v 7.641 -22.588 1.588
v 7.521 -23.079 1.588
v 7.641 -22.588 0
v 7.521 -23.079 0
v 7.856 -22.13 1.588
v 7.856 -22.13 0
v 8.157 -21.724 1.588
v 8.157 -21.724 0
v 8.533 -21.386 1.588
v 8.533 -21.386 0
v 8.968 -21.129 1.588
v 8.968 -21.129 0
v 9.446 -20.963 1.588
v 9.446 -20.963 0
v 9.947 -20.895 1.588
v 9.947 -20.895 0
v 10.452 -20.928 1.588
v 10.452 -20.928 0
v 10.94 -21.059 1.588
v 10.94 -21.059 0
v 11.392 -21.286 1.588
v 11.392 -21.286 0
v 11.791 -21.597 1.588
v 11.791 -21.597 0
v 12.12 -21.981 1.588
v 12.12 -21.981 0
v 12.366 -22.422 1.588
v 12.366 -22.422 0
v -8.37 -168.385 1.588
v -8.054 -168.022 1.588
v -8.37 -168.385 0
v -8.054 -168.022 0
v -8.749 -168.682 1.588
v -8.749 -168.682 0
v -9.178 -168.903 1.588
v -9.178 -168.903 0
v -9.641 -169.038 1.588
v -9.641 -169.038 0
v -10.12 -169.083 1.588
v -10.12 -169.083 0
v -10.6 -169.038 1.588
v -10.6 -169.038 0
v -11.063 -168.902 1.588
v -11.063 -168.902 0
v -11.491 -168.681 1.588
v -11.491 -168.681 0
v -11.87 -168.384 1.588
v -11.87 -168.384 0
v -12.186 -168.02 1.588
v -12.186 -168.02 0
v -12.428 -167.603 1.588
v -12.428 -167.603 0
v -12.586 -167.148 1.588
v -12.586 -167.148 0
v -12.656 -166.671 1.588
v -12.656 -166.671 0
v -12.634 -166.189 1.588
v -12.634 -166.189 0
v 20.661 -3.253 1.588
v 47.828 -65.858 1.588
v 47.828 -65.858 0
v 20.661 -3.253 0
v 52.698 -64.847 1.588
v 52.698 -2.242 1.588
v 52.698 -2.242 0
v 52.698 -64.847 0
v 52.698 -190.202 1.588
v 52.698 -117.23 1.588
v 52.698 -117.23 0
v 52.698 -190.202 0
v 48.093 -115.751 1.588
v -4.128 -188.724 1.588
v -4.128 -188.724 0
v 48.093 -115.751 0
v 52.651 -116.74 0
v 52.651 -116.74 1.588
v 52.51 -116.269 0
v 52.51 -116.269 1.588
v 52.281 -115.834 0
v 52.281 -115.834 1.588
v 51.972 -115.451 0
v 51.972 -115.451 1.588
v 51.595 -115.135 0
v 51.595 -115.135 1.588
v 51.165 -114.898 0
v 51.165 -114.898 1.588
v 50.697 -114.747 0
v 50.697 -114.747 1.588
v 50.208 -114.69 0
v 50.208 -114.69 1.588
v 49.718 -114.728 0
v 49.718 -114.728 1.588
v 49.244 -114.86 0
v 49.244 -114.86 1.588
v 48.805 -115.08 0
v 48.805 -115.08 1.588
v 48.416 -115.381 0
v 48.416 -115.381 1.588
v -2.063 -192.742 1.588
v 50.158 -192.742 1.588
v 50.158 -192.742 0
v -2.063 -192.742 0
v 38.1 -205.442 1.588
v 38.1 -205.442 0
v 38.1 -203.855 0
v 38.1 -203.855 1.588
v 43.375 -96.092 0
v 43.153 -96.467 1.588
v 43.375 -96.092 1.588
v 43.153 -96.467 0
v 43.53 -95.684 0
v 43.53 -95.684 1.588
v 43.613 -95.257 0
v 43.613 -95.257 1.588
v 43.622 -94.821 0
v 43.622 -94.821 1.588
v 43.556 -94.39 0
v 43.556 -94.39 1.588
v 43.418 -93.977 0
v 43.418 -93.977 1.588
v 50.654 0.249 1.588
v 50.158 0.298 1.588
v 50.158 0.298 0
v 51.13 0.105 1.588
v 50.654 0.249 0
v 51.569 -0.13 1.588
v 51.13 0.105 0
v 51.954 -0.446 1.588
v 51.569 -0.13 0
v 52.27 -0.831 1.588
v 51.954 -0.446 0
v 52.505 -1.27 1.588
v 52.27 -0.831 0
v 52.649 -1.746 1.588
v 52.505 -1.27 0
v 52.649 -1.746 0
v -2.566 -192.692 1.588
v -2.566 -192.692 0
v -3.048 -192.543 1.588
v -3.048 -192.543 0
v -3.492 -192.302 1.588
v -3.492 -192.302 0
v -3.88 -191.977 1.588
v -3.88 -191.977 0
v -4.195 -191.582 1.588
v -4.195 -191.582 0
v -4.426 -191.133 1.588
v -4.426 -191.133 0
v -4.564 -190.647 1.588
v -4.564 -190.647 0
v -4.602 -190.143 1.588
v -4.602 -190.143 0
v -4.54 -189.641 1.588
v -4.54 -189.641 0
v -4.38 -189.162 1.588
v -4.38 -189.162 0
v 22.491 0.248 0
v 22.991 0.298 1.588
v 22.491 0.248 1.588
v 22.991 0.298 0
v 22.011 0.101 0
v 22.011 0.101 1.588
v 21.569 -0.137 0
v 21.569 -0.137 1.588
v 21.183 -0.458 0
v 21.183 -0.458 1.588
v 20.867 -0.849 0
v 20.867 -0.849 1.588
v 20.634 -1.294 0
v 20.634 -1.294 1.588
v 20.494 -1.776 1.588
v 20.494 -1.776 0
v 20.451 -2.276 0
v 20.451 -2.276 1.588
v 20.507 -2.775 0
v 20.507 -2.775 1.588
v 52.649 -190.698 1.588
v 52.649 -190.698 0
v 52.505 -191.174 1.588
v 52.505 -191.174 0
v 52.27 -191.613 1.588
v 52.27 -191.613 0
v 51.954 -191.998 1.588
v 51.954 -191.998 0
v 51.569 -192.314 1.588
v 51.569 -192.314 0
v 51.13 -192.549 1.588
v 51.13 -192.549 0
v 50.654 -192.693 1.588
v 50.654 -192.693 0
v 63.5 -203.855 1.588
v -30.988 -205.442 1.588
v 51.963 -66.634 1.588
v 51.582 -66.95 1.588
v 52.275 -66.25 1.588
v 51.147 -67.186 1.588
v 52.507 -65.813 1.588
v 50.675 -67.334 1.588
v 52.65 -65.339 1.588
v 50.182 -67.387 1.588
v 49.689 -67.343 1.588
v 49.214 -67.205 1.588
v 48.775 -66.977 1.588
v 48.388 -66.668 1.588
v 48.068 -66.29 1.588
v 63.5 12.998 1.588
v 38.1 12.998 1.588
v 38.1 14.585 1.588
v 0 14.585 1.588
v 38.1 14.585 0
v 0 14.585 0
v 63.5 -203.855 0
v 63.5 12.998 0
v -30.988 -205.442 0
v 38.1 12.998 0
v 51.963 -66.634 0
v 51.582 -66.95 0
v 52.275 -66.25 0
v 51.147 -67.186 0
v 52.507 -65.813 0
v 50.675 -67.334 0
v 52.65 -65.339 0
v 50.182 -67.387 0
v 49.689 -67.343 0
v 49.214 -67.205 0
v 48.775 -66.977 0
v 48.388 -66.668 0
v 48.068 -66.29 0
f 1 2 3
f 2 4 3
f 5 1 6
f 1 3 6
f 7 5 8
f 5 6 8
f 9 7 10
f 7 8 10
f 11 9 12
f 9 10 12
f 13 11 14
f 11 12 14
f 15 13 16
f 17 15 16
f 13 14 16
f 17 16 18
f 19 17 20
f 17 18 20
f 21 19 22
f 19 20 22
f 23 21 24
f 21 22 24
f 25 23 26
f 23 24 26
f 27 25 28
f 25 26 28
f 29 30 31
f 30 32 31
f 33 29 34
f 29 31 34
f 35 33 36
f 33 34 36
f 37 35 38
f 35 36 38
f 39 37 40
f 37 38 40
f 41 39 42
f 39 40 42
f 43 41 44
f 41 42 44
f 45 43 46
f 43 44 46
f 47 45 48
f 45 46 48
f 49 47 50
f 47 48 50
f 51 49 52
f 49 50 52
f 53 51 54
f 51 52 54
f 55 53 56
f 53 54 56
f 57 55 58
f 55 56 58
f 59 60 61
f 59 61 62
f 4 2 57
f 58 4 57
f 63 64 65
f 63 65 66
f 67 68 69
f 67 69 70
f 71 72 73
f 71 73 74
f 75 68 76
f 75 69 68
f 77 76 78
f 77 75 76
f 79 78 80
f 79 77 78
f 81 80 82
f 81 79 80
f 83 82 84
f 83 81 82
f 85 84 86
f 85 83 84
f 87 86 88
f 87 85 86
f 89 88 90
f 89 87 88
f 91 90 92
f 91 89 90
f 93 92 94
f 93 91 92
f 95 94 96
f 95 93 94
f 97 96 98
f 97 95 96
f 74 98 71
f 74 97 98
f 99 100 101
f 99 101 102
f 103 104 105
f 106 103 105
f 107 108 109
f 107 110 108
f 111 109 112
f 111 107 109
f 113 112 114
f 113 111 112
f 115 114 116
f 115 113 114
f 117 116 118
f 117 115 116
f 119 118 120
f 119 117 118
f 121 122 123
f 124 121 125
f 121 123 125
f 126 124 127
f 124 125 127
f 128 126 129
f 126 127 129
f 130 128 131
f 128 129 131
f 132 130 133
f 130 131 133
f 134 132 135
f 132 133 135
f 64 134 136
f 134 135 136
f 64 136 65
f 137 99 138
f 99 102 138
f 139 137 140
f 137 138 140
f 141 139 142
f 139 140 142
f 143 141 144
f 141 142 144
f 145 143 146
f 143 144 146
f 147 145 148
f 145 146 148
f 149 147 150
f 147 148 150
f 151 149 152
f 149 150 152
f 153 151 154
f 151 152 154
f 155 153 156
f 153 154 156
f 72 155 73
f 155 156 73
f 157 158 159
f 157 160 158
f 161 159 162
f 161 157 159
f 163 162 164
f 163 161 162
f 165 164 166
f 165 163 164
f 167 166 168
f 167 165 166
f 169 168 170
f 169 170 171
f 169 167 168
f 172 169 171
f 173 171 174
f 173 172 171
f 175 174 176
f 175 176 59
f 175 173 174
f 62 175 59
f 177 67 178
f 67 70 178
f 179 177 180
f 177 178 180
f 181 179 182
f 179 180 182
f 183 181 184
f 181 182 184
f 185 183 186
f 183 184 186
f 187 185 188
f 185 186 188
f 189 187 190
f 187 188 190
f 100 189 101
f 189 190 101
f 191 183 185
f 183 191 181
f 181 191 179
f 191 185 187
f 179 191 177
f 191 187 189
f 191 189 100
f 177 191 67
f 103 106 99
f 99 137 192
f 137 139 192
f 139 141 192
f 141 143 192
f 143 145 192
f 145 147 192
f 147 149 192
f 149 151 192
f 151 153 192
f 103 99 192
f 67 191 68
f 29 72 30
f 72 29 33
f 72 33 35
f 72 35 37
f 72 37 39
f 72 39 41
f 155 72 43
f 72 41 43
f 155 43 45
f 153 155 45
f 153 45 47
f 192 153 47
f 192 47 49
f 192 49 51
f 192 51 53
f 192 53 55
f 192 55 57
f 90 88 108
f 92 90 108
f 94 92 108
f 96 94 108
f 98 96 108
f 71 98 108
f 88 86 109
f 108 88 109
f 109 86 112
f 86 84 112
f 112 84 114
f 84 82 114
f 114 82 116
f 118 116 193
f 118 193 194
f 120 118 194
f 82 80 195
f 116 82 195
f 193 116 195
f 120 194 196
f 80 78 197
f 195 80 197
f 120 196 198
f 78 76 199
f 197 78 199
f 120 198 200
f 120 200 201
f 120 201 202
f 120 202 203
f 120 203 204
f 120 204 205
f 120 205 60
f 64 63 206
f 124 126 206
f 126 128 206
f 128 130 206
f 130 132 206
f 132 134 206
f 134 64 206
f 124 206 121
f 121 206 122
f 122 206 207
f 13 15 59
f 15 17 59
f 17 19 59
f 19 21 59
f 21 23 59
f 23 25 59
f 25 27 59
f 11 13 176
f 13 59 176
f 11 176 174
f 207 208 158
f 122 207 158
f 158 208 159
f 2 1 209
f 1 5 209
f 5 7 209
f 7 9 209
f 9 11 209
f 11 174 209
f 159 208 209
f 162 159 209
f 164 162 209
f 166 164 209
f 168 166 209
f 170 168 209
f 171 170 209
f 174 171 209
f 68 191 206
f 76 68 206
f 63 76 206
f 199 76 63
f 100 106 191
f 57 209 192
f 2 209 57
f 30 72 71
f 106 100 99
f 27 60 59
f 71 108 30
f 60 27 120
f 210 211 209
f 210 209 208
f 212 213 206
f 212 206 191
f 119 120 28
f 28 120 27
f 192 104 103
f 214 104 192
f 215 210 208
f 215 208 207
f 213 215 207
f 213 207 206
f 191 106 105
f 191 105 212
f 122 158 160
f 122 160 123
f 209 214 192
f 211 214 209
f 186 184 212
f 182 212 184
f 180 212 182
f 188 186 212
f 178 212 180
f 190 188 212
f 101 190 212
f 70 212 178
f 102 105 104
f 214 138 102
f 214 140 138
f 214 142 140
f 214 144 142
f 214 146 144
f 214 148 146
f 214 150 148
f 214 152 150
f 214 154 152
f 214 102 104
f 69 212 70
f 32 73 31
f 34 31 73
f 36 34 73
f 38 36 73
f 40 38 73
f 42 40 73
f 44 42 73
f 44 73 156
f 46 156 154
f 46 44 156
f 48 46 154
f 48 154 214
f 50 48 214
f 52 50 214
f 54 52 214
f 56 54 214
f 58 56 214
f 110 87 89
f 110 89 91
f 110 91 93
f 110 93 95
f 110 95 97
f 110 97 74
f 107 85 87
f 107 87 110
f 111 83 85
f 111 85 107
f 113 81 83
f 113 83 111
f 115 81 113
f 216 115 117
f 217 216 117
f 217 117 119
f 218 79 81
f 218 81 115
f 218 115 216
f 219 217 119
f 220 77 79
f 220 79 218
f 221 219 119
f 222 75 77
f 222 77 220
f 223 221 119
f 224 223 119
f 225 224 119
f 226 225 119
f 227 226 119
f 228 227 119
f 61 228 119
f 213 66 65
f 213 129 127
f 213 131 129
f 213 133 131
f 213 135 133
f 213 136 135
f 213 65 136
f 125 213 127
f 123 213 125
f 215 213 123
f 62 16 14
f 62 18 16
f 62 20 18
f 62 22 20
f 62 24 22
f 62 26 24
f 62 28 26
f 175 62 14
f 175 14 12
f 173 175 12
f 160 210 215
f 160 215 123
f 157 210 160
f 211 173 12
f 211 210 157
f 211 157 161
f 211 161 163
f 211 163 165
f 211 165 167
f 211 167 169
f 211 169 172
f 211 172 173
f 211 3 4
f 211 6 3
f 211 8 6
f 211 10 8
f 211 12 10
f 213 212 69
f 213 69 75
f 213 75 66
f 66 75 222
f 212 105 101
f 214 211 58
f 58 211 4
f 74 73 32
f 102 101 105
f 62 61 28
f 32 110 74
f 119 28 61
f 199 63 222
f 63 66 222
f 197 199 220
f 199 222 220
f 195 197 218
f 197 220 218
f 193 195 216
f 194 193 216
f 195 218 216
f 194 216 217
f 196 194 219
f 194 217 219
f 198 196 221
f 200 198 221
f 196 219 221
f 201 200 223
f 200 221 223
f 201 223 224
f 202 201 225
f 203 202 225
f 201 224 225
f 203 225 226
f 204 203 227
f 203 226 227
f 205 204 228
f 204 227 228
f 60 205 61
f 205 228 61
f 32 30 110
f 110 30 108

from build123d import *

# Parameters (mm, degrees)
BOSS_EXTRUDE2_DEPTH = 1.5875
CUT_EXTRUDE4_DEPTH  = 216.037664516
FILLET4_R           = 2.54
SKETCH8_W           = 25.4
SKETCH8_H           = 1.5875
CUT_EXTRUDE5_DEPTH  = 216.037664516


with BuildPart() as part:
    # Sketch6 → Boss-Extrude2 (new body)
    with BuildSketch(Plane.XY):
        Polygon((63.5, 12.997971671), (63.5, -205.442028329), (-30.988, -205.442028329), (0, 14.585471671), (38.1, 14.585471671), (38.1, 12.997971671), align=None)
    extrude(amount=BOSS_EXTRUDE2_DEPTH)

    # Sketch7 → Cut-Extrude4 (cut, through all)
    with BuildSketch(Plane.XY.offset(1.5875)):
        Polygon((-14.078119511, -176.440074821), (43.990131885, -95.296788202), (8.777825003, -14.153501583), align=None)
        Polygon((-7.003851095, -192.742028329), (52.698191605, -109.315717977), (52.698191605, -192.742028329), align=None)
        Polygon((52.698191605, -77.080404102), (19.119676028, 0.297971671), (52.698191605, 0.297971671), align=None)
    extrude(amount=-CUT_EXTRUDE4_DEPTH, mode=Mode.SUBTRACT)

    # Fillet4
    fillet4_edges = [part.edges().sort_by_distance(p)[0] for p in [
        (52.698191605, -109.315717977, 0.79375),
        (52.698191605, -192.742028329, 0.79375),
        (-7.003851095, -192.742028329, 0.79375),
        (-14.078119511, -176.440074821, 0.79375),
        (8.777825003, -14.153501583, 0.79375),
        (43.990131885, -95.296788202, 0.79375),
        (52.698191605, 0.297971671, 0.79375),
        (52.698191605, -77.080404102, 0.79375),
        (19.119676028, 0.297971671, 0.79375),
    ]]
    fillet(fillet4_edges, radius=FILLET4_R)

    # Sketch8 → Cut-Extrude5 (cut, through all)
    with BuildSketch(Plane.XY.offset(1.5875)):
        with Locations((50.8, -204.648278329)):
            Rectangle(SKETCH8_W, SKETCH8_H)
    extrude(amount=-CUT_EXTRUDE5_DEPTH, mode=Mode.SUBTRACT)


solid = part.part
